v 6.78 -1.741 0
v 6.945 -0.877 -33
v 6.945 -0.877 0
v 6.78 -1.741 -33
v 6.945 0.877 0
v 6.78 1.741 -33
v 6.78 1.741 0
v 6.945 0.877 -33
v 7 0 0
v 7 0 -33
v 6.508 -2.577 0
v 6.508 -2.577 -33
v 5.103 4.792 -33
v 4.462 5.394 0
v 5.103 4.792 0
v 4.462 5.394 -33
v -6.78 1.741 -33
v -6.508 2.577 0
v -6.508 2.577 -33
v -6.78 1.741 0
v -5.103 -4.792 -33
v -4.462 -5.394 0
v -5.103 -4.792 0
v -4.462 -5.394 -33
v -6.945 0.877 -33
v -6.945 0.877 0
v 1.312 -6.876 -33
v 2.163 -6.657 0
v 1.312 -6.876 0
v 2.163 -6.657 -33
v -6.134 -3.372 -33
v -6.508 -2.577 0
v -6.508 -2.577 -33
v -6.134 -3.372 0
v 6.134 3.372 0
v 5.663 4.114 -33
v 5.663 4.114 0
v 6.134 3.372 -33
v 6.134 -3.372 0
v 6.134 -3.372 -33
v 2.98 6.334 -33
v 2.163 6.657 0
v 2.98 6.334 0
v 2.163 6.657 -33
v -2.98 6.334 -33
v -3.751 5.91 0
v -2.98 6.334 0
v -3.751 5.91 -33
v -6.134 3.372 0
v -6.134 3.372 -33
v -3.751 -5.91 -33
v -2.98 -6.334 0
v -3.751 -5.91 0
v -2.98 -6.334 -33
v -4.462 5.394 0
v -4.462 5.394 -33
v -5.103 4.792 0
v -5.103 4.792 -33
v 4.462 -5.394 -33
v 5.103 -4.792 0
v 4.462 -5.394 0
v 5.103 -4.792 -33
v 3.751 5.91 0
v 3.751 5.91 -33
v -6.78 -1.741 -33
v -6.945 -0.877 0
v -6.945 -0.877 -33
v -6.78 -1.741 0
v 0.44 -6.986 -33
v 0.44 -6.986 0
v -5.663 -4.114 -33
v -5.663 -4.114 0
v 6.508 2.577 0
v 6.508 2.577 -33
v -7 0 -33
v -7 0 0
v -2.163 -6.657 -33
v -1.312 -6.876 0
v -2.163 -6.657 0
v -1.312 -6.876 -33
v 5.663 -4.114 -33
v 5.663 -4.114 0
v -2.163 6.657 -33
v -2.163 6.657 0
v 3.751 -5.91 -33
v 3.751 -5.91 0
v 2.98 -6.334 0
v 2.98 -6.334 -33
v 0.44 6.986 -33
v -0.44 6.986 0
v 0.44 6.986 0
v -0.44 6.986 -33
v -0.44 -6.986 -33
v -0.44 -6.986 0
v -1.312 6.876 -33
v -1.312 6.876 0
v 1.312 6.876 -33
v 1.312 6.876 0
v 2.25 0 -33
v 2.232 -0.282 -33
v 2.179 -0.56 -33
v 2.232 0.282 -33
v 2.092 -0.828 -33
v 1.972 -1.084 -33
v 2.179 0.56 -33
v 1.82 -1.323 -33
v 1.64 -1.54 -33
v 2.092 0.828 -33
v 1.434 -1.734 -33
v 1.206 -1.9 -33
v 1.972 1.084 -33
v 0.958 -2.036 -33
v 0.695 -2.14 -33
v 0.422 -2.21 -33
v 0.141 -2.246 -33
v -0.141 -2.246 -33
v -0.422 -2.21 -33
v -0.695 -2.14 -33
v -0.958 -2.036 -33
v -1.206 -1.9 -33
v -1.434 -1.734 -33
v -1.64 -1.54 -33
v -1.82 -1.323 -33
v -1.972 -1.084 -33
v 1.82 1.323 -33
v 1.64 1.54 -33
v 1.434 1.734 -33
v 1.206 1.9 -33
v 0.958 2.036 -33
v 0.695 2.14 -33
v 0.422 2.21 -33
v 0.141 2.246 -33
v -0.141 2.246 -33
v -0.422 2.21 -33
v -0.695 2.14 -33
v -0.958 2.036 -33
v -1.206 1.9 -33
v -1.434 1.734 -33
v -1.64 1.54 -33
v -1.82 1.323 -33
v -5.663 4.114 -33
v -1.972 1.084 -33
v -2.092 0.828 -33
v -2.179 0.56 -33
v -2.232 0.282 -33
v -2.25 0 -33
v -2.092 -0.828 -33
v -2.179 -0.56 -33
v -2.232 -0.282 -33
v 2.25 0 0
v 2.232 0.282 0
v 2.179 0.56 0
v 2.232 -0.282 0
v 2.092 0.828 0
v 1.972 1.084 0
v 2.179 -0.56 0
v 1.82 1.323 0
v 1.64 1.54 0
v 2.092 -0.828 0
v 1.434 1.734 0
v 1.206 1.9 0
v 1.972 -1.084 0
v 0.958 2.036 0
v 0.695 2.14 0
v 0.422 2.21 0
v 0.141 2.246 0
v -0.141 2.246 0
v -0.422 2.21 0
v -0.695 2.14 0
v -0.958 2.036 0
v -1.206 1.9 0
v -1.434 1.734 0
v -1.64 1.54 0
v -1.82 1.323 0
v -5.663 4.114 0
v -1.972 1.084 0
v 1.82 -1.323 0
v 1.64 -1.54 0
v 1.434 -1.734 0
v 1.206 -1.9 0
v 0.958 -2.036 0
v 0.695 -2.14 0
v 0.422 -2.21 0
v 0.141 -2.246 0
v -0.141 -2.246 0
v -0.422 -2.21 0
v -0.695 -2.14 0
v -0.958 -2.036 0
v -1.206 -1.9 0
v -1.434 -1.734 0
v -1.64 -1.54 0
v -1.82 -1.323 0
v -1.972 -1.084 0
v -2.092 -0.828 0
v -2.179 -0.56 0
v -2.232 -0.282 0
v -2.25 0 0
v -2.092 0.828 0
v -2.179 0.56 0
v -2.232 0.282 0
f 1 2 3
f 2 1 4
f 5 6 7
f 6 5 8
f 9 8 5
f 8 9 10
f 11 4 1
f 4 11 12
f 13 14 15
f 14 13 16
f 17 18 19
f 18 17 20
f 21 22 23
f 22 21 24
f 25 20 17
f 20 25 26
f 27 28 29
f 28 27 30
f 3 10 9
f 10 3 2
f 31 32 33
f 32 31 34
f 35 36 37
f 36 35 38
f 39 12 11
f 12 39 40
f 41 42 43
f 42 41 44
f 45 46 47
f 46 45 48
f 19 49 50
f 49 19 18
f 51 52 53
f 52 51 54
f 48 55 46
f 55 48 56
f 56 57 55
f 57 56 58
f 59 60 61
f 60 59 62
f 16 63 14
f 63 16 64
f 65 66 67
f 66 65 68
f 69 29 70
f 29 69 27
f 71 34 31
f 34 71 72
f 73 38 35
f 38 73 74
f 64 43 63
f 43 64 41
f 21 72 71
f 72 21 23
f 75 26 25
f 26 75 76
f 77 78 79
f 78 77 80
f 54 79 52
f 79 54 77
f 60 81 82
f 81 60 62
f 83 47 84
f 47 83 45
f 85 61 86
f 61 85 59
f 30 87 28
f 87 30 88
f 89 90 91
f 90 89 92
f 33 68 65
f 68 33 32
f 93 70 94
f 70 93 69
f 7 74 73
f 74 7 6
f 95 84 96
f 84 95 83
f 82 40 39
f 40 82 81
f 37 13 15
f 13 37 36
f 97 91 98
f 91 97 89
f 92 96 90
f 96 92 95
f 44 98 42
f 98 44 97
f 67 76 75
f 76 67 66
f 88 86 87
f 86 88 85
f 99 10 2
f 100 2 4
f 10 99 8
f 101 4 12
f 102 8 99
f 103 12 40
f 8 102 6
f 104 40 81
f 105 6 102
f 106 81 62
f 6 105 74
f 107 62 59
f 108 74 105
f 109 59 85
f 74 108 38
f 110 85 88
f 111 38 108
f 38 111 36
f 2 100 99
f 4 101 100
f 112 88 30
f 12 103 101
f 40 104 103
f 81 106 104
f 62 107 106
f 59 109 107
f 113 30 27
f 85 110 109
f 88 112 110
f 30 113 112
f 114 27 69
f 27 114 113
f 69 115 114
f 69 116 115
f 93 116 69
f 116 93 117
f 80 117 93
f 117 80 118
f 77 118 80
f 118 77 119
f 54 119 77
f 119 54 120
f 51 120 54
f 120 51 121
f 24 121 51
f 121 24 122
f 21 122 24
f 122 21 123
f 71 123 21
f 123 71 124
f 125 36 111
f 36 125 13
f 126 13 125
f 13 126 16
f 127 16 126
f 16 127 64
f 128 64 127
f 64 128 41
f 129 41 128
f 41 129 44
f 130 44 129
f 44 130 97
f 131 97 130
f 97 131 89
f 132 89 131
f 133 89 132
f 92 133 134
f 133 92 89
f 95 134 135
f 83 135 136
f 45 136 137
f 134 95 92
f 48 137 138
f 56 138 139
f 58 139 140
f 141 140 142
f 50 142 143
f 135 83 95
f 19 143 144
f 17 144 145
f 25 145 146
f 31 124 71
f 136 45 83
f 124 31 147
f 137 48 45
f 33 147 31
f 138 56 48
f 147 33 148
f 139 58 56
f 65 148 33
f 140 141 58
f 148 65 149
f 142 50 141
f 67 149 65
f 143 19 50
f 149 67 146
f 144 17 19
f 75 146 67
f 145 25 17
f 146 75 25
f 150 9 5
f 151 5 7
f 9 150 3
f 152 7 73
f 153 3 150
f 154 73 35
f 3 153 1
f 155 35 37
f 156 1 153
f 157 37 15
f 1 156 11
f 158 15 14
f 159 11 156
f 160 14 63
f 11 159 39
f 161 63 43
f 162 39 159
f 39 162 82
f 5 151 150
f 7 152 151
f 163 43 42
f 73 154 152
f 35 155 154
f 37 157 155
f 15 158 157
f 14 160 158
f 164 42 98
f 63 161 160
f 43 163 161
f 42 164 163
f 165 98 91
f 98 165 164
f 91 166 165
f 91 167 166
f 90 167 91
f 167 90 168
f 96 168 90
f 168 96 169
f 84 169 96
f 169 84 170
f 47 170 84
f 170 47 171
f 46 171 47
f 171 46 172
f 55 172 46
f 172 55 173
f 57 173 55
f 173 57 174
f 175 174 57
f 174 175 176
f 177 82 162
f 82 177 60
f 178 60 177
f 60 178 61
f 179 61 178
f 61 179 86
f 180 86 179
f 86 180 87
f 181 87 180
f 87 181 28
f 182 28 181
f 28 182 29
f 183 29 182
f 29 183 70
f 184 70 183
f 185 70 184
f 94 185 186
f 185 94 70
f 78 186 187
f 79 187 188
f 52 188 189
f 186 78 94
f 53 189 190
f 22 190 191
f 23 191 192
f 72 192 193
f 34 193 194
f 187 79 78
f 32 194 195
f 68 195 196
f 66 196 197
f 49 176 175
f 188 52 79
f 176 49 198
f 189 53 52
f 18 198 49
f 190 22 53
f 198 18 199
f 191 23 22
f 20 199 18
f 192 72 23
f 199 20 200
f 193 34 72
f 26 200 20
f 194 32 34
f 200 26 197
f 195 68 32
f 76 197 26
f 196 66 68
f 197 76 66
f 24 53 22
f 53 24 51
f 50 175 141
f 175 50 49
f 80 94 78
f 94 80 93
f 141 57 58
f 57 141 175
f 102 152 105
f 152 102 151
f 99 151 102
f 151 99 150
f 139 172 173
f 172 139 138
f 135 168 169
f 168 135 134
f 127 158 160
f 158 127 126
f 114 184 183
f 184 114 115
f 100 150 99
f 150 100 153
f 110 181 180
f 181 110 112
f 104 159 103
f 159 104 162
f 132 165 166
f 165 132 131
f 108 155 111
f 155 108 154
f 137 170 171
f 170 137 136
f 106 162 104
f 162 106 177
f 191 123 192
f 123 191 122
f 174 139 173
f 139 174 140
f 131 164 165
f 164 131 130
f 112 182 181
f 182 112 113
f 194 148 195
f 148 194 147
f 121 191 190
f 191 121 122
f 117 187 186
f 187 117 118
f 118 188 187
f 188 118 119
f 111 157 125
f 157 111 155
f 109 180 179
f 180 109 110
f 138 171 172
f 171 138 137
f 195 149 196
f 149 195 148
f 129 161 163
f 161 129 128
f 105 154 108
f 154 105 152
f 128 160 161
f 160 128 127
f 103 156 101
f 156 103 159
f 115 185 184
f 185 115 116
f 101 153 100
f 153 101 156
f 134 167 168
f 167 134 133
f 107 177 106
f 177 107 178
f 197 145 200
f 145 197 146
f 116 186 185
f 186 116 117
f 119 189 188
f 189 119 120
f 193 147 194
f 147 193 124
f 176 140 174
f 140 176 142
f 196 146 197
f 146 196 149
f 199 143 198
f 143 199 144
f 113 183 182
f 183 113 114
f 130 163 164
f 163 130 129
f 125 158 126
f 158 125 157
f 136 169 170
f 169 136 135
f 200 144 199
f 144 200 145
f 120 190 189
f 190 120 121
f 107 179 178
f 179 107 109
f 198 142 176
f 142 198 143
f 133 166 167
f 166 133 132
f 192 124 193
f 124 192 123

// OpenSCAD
$fn = 50;


difference() {
	union() {
		translate(v = [0, 0, -33.0000000000]) {
			cylinder(h = 33, r = 7.0000000000);
		}
		cylinder(h = 0, r = 10.0000000000);
	}
	union() {
		#translate(v = [0, 0, -33]) {
			cylinder(h = 33, r = 2.2500000000);
		}
	}
}
